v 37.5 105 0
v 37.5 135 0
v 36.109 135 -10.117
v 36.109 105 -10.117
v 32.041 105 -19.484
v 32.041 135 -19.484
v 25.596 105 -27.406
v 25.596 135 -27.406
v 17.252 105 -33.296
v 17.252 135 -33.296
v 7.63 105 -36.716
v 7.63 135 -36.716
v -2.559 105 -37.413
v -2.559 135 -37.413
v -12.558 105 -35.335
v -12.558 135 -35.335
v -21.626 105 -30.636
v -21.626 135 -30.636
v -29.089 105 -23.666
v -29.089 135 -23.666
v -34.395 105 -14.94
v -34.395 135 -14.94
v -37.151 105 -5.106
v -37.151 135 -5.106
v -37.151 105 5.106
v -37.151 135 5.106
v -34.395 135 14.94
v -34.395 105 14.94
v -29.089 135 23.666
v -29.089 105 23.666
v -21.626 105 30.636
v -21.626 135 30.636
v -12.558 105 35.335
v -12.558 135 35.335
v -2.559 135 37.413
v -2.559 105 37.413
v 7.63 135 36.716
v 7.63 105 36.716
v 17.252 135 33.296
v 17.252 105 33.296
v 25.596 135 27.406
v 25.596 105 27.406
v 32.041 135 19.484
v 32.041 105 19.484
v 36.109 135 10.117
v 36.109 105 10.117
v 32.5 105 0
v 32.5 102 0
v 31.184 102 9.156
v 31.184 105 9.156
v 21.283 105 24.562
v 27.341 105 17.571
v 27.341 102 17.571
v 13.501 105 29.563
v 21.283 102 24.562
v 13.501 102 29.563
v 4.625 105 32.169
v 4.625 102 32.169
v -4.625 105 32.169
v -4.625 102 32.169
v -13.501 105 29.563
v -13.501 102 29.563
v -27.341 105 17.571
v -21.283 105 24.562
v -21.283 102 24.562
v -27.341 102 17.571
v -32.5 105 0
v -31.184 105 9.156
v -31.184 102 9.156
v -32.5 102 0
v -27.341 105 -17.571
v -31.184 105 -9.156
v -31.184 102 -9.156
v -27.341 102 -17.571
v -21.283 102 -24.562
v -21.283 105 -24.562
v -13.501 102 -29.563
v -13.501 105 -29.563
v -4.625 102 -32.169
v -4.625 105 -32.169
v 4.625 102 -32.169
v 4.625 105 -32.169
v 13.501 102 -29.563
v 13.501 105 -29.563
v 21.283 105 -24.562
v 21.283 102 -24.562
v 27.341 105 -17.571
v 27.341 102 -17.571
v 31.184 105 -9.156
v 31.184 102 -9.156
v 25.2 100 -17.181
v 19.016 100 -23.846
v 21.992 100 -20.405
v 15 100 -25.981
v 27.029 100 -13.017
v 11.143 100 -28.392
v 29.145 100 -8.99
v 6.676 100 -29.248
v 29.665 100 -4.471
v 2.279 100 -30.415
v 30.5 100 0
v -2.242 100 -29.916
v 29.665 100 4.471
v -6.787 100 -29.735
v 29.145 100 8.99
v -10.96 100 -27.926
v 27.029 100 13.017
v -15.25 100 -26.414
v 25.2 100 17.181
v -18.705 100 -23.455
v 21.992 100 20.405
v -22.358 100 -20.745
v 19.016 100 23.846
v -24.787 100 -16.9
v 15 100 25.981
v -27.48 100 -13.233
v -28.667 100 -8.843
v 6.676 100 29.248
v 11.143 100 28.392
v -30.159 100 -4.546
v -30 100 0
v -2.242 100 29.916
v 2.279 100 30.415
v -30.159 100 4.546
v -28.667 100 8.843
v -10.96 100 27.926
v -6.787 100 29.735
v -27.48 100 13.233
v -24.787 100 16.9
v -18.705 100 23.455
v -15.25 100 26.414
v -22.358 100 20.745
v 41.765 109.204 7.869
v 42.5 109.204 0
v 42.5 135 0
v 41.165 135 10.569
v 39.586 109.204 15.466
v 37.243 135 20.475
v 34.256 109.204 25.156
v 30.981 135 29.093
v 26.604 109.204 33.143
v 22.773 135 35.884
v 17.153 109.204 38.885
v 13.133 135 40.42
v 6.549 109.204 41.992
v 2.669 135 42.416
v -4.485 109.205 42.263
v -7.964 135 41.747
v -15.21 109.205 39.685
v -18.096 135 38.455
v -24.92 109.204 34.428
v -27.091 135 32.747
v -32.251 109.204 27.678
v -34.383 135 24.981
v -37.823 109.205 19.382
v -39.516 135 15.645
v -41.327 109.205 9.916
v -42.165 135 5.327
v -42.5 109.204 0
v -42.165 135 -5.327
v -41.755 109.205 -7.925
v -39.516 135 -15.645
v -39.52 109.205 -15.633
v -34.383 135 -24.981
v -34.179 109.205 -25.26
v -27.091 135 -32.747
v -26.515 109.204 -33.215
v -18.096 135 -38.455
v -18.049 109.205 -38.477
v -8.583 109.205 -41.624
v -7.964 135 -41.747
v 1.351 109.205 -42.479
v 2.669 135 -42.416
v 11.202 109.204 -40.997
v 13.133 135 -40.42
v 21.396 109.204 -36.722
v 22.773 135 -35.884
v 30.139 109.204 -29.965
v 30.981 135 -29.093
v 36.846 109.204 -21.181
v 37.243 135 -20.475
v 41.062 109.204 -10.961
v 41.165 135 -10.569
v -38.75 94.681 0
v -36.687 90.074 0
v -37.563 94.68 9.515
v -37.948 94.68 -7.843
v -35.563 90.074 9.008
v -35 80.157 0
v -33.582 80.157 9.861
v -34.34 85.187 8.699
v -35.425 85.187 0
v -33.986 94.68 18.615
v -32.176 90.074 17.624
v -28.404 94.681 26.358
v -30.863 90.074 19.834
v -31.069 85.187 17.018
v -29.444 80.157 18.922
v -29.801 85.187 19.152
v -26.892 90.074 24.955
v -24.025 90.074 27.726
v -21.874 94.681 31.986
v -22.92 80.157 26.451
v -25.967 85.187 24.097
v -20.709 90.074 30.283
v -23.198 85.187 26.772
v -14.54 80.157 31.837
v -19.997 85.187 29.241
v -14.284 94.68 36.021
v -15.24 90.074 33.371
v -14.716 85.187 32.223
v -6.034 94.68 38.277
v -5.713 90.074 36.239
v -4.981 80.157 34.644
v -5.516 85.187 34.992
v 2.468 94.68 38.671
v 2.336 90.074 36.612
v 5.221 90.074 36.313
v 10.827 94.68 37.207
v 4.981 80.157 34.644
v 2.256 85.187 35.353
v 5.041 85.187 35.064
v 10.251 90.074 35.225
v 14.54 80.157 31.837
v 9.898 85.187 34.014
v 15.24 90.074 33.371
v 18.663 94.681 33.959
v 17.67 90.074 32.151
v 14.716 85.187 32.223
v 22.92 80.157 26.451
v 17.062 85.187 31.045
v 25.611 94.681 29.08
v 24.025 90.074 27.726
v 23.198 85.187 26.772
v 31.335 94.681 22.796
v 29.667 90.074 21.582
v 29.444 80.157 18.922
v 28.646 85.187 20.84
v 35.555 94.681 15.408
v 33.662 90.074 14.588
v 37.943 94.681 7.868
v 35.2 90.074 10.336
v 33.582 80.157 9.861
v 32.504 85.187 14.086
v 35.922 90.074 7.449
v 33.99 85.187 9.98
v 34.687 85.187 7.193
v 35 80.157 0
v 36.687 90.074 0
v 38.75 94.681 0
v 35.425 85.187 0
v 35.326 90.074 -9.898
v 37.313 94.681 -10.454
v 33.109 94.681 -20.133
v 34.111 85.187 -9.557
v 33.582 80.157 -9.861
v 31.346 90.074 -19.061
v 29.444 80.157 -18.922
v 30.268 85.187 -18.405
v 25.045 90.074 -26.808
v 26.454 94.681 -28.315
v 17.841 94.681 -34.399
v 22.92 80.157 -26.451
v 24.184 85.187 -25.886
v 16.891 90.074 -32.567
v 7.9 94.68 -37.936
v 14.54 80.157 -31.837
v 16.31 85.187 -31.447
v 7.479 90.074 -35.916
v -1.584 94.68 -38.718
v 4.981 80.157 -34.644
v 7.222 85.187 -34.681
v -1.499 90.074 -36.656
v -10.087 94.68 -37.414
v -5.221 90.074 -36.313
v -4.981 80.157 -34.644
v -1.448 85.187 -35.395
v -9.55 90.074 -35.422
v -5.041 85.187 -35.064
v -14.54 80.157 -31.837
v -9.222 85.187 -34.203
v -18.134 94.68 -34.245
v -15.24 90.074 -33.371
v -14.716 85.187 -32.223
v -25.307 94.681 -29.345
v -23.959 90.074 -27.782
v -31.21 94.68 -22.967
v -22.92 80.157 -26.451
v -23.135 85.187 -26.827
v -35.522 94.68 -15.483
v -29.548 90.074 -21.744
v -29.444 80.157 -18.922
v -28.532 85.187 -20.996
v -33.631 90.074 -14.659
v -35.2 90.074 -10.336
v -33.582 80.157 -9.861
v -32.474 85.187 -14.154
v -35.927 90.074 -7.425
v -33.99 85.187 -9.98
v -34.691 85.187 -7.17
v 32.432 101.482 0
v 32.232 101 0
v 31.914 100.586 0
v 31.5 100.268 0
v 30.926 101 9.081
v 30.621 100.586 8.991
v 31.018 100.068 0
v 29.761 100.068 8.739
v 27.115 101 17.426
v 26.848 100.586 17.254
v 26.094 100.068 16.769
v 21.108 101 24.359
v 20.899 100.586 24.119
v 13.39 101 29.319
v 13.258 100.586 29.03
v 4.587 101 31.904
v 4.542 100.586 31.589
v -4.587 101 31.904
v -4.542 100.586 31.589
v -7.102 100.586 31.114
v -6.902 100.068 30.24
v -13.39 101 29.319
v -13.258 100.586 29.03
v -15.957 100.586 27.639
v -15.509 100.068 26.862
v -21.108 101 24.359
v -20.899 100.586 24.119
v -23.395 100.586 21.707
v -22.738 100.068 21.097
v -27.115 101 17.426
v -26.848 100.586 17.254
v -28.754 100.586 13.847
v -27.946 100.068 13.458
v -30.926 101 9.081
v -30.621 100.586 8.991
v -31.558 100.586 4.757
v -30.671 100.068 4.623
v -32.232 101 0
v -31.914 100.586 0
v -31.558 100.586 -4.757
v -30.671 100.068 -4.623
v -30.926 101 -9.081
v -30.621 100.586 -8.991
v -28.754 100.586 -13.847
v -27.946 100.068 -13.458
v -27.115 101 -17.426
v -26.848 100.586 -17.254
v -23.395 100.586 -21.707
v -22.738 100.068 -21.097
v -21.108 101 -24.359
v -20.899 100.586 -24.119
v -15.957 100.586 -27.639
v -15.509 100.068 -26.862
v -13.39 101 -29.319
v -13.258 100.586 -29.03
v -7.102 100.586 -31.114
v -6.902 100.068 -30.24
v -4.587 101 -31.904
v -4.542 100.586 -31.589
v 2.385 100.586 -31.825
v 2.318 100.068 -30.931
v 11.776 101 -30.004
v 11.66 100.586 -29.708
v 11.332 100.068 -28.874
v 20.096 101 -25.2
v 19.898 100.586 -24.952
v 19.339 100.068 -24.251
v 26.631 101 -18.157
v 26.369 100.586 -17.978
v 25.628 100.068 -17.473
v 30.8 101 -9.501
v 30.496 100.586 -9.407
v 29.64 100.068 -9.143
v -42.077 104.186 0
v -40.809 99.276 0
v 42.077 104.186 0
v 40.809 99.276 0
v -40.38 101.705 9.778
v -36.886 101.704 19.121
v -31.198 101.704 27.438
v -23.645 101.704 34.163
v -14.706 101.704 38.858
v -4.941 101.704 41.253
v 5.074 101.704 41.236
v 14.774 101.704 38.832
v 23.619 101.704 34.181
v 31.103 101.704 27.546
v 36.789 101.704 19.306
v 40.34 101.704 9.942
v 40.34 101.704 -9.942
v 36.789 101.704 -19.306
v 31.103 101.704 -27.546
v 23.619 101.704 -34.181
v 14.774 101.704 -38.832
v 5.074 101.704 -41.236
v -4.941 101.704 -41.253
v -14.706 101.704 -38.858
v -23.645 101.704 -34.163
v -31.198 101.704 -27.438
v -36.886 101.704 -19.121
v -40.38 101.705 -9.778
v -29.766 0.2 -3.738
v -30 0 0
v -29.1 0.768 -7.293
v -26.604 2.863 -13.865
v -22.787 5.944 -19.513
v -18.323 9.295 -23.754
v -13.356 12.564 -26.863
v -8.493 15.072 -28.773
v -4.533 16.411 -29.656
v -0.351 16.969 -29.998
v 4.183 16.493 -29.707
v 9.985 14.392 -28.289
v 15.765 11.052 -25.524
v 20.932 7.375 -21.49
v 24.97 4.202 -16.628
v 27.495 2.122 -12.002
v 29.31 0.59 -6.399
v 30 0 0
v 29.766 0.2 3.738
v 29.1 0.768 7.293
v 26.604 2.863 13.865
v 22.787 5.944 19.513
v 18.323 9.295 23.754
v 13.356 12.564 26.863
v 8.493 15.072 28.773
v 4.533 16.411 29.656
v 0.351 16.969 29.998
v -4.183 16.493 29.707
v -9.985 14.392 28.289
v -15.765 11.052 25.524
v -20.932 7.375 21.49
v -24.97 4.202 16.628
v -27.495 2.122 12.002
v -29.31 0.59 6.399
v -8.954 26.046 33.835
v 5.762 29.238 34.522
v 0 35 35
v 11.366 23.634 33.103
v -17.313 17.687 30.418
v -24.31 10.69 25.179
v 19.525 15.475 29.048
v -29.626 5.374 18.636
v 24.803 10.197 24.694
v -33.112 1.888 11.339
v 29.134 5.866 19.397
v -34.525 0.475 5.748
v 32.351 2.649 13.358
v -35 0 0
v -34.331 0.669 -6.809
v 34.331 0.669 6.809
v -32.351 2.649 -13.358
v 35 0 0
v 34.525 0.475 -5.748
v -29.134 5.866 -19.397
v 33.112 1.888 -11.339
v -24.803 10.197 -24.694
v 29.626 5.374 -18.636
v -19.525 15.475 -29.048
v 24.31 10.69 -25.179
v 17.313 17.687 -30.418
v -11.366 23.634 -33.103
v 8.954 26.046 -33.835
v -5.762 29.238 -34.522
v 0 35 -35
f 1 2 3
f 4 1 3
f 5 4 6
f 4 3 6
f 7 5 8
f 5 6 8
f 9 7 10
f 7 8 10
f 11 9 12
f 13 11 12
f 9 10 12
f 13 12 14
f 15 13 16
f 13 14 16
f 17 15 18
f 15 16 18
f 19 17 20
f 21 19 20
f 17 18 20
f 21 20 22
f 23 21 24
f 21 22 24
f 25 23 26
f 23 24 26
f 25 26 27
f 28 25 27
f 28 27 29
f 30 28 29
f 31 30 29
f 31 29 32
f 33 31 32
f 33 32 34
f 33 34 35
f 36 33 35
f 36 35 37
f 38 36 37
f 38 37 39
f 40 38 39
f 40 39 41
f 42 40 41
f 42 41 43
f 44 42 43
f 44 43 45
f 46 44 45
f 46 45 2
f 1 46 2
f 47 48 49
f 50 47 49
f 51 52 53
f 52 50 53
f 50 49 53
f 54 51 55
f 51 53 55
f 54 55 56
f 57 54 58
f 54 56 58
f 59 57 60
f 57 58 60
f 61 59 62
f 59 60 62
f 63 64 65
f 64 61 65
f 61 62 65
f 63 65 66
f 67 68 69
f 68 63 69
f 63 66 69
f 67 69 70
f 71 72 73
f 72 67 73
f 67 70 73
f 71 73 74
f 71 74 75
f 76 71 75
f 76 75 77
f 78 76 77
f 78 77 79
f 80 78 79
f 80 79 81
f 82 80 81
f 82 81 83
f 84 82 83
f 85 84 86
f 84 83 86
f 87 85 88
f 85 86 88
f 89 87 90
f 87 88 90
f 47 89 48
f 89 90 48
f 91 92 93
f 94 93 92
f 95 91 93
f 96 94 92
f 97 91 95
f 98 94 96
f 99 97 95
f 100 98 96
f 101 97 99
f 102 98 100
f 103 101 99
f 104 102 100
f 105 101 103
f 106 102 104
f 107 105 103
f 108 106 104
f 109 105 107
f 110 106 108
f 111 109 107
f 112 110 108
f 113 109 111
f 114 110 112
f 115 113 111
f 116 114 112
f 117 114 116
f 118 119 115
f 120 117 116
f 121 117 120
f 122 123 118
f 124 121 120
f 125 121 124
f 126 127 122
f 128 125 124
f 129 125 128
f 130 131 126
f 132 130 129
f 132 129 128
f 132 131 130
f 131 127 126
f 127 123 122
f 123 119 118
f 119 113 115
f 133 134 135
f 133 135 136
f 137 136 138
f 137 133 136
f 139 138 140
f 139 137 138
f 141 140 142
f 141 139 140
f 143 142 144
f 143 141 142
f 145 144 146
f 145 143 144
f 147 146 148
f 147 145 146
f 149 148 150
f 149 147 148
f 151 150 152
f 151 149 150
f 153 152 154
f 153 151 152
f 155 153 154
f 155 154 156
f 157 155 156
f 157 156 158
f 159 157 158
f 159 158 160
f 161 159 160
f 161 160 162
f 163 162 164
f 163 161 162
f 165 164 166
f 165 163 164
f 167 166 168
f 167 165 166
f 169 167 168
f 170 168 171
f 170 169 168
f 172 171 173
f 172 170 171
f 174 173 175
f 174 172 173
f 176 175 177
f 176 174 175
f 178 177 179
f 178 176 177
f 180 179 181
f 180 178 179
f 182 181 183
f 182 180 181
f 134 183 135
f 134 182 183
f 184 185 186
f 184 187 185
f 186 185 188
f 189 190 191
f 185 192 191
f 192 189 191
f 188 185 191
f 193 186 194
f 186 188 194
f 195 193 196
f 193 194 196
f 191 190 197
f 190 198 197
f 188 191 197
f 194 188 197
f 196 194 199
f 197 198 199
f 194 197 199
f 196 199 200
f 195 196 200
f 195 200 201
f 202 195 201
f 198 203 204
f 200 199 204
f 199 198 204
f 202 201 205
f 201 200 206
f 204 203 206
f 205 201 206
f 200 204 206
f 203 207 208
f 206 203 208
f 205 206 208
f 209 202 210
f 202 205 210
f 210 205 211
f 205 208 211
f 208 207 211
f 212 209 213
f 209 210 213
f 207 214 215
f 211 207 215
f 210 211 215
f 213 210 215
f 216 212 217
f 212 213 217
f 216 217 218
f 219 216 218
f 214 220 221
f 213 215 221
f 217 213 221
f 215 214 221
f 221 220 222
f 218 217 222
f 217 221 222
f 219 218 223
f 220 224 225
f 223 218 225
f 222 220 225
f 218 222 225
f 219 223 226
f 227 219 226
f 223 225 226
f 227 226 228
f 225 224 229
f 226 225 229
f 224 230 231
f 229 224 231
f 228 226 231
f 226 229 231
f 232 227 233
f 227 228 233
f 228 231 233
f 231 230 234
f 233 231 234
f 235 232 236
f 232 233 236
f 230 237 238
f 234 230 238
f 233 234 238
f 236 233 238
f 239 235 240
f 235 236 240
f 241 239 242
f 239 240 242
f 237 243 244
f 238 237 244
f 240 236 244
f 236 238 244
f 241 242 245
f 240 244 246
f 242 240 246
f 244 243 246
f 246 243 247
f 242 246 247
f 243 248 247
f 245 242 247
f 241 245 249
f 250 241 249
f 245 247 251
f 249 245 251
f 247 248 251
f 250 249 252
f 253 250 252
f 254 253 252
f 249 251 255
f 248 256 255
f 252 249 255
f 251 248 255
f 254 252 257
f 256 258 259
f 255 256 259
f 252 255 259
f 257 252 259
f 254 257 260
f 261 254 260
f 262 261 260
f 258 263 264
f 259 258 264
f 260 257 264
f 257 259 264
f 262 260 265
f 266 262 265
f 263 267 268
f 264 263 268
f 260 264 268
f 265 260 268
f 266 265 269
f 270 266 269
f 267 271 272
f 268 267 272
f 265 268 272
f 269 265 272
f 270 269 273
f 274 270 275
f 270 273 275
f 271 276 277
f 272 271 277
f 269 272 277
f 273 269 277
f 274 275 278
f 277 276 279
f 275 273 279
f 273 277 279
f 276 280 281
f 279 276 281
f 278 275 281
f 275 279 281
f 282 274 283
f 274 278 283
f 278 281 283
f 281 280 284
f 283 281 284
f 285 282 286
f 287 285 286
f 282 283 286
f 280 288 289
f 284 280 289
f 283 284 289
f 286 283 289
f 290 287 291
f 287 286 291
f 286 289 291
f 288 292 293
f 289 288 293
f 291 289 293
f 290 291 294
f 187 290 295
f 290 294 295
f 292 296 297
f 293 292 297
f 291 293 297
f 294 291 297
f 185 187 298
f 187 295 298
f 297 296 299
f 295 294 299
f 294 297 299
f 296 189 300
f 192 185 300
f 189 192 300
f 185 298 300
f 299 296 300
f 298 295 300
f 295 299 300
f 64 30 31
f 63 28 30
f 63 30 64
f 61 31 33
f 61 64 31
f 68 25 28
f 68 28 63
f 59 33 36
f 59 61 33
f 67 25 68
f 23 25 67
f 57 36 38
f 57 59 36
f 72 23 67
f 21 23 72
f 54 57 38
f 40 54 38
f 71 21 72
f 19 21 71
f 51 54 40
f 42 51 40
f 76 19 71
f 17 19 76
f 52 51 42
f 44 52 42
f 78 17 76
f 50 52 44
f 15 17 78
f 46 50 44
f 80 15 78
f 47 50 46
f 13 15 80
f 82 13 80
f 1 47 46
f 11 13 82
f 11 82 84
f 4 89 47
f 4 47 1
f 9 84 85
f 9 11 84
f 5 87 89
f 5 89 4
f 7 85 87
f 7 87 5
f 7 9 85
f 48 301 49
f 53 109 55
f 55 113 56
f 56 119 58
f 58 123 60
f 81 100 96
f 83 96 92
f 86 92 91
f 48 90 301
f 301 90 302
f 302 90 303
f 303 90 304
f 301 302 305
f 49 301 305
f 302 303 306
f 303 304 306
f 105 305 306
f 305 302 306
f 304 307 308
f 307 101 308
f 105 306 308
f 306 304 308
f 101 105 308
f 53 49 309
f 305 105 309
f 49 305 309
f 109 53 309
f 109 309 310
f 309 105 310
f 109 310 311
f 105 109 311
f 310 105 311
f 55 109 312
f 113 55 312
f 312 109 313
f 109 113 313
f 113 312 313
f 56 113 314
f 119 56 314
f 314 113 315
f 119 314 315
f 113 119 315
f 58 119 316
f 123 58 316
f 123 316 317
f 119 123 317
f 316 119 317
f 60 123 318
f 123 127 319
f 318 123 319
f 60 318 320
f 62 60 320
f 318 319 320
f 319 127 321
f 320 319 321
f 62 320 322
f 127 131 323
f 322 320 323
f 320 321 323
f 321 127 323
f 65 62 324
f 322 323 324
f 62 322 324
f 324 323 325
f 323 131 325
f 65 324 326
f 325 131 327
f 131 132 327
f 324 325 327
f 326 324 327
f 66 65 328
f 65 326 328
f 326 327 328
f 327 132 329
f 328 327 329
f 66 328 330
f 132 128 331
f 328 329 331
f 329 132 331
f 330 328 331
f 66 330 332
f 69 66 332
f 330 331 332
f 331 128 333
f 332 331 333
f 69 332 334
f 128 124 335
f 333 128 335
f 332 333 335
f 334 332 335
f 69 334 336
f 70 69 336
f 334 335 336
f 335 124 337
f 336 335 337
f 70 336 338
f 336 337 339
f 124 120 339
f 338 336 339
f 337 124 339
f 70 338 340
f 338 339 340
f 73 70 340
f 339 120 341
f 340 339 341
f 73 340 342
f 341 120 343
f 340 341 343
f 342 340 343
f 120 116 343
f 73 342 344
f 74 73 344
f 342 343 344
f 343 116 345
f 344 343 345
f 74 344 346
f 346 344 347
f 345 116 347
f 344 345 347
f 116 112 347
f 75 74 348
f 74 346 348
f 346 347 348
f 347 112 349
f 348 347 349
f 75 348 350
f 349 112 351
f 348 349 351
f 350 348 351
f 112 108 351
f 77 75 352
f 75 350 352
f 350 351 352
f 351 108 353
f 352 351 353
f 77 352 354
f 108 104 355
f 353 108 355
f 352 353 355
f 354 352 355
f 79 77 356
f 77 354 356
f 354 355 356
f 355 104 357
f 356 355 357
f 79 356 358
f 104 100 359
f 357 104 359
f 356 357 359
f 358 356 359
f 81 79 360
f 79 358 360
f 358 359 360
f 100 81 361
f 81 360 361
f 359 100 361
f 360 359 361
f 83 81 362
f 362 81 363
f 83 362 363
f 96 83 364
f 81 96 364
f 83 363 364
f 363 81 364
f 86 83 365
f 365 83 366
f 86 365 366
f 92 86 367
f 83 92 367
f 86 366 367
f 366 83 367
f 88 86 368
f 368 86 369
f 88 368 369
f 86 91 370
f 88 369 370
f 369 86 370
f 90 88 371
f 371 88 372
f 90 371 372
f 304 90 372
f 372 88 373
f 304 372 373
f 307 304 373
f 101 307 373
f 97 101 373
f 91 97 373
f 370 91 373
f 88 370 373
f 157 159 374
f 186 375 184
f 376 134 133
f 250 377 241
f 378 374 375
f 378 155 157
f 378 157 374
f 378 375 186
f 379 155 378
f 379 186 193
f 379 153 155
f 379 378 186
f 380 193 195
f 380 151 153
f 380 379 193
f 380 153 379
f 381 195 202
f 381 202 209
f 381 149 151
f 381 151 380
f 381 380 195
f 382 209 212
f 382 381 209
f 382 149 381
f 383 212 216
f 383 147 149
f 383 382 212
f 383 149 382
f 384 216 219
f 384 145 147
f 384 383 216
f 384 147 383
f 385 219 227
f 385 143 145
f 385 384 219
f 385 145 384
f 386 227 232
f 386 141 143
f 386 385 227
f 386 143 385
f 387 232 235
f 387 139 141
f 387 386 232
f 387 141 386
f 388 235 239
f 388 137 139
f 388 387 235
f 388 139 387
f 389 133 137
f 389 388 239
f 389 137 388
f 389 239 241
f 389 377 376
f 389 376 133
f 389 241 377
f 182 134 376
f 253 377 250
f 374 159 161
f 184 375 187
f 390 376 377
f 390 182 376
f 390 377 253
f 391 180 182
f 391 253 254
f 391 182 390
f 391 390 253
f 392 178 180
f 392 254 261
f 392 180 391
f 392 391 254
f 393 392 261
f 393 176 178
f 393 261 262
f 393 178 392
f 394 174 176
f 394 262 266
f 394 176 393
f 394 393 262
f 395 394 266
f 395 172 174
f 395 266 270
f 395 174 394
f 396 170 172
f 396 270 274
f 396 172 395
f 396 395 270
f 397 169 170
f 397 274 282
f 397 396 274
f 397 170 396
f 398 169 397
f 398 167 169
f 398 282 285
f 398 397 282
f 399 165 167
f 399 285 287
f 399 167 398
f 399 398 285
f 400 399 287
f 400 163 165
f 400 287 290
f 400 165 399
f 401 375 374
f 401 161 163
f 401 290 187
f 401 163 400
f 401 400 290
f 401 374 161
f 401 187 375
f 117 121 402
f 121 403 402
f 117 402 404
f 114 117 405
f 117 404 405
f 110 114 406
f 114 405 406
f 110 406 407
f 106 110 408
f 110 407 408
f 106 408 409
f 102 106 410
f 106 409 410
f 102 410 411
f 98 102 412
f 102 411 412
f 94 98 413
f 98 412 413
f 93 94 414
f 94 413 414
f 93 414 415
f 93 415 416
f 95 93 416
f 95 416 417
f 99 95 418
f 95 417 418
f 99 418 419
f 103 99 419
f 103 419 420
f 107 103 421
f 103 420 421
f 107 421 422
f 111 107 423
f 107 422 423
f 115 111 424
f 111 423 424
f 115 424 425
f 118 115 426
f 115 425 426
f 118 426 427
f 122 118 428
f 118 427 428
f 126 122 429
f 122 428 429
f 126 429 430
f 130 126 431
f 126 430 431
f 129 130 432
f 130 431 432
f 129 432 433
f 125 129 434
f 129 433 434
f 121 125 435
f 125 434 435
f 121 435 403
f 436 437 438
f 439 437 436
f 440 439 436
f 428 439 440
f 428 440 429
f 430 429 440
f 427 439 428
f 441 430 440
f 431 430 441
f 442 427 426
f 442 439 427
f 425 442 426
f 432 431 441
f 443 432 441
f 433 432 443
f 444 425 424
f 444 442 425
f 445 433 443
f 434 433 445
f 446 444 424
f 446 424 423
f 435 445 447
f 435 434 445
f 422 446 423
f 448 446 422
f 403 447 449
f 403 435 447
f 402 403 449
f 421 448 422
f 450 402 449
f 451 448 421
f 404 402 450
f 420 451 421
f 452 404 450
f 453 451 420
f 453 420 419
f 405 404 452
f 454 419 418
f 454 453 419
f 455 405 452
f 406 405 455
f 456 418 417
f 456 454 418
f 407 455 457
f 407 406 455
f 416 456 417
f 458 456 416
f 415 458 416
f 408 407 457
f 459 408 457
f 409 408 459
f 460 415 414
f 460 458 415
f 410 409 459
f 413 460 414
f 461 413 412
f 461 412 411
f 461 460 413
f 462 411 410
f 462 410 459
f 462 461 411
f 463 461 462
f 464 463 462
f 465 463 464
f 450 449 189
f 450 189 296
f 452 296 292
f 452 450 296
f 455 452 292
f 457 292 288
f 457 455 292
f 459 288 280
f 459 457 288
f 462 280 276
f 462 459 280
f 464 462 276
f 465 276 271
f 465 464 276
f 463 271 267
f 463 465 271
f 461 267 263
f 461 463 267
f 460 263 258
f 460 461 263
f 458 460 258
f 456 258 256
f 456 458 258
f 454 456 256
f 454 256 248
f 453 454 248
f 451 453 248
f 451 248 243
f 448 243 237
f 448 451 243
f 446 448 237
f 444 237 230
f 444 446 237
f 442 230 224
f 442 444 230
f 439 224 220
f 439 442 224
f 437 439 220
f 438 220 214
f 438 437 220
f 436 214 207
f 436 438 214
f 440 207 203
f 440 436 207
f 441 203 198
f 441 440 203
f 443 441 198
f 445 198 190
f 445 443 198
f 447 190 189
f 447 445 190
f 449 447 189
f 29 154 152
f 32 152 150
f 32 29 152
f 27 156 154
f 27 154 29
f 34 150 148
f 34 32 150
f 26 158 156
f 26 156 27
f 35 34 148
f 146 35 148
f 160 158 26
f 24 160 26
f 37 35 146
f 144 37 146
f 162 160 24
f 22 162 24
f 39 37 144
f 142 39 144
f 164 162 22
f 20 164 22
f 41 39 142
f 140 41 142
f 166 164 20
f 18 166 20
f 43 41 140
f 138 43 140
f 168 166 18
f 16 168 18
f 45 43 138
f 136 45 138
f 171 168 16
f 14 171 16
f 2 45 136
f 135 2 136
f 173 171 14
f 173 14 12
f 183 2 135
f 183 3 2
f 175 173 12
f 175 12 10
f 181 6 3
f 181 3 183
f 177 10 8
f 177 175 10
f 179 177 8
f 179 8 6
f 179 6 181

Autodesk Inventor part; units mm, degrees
ref_plane "YZ Plane" through (0, 0, 0) normal (1, 0, 0) x (0, 1, 0)
ref_plane "XZ Plane" through (0, 0, 0) normal (0, 1, 0) x (-1, 0, 0)
ref_plane "XY Plane" through (0, 0, 0) normal (0, 0, 1) x (1, 0, 0)
sketch "Boceto1" plane through (0, 0, 0) normal (0, 1, 0) x (-1, 0, 0)
  circle A0 centre (0, 0) radius 30
  circle A1 centre (0, 0) radius 35
  dimension "d0" = 60
  dimension "d1" = 70
extrude "Extrusión1" add sketch "Boceto1" along normal blind 100
sketch "Boceto2" plane through (0, 0, 0) normal (0, -1, 0) x (1, 0, 0)
  line L0 (0, 0) -> (0, 45)
  line L1 (45, 35) -> (45, -35)
  line L2 (40, 35) -> (40, -35)
  line L3 (45, 0) -> (45, -35)
  line L4 (45, -35) -> (40, -35)
  line L5 (45, 0) -> (45, 35)
  line L6 (45, 35) -> (40, 35)
extrude "Extrusión2" add sketch "Boceto2" against normal blind 35
sketch "Boceto3" plane through (45, 0, 35) normal (1, 0, 0) x (0, 0, -1)
  line L0 (35, 0) -> (35, 35)
  circle A0 centre (35, 35) radius 35
  line L1 (0, 0) -> (0, 35) projected
  line L2 (0, 35) -> (0, 0)
  line L3 (70, 0) -> (0, 0) projected
  line L4 (0, 0) -> (70, 0)
  line L5 (70, 0) -> (70, 35) projected
  line L6 (70, 0) -> (70, 35)
  point P0 (70, 35)
extrude "Extrusión3" cut sketch "Boceto3" against normal blind 100 contours L5 L3 A0 | A0 L3 L1
sketch "Boceto4" plane through (45, 35, 0) normal (1, 0, 0) x (0, 0, -1)
  line L0 (-35, 0) -> (35, 0) projected
  line L1 (-35, 0) -> (35, 0)
  point P0 (0, -35)
sketch "Boceto5" plane through (0, 35, 0) normal (0, 1, 0) x (1, 0, 0)
  line L0 (40, 35) -> (40, -35) projected
  line L1 (40, -35) -> (45, -35) projected
  line L2 (40, -35) -> (45, -35)
  line L3 (45, -35) -> (45, 35) projected
  line L4 (45, -35) -> (45, 35)
  line L5 (45, 35) -> (40, 35) projected
  line L6 (45, 35) -> (40, 35)
  line L7 (40, 35) -> (40, -35)
  point P0 (0, 0)
extrude "Extrusión4" cut sketch "Boceto5" against normal blind 35
sketch "Boceto6" plane through (0, 100, 0) normal (0, 1, 0) x (1, 0, 0)
  circle A0 centre (0, 0) radius 42.5
  circle A1 centre (0, 0) radius 32.5
  dimension "d19" = 85
  dimension "d20" = 65
extrude "Extrusión5" add sketch "Boceto6" along normal blind 35
fillet "Empalme1" radius 30 1 edges at (35, 100, 0)
fillet "Empalme2" radius 2 1 edges at (-32.5, 100, 0)
fillet "Empalme3" radius 30 2 edges at (0, 100, -42.5) (0, 100, 42.5)
sketch "Boceto7" plane through (0, 135, 0) normal (0, 1, 0) x (1, 0, 0)
  circle A0 centre (0, 0) radius 32.5
  circle A1 centre (0, 0) radius 37.5
  dimension "d26" = 75
extrude "Extrusión6" cut sketch "Boceto7" against normal blind 30
properties part number "Modelo1_tronco_Pepu"
